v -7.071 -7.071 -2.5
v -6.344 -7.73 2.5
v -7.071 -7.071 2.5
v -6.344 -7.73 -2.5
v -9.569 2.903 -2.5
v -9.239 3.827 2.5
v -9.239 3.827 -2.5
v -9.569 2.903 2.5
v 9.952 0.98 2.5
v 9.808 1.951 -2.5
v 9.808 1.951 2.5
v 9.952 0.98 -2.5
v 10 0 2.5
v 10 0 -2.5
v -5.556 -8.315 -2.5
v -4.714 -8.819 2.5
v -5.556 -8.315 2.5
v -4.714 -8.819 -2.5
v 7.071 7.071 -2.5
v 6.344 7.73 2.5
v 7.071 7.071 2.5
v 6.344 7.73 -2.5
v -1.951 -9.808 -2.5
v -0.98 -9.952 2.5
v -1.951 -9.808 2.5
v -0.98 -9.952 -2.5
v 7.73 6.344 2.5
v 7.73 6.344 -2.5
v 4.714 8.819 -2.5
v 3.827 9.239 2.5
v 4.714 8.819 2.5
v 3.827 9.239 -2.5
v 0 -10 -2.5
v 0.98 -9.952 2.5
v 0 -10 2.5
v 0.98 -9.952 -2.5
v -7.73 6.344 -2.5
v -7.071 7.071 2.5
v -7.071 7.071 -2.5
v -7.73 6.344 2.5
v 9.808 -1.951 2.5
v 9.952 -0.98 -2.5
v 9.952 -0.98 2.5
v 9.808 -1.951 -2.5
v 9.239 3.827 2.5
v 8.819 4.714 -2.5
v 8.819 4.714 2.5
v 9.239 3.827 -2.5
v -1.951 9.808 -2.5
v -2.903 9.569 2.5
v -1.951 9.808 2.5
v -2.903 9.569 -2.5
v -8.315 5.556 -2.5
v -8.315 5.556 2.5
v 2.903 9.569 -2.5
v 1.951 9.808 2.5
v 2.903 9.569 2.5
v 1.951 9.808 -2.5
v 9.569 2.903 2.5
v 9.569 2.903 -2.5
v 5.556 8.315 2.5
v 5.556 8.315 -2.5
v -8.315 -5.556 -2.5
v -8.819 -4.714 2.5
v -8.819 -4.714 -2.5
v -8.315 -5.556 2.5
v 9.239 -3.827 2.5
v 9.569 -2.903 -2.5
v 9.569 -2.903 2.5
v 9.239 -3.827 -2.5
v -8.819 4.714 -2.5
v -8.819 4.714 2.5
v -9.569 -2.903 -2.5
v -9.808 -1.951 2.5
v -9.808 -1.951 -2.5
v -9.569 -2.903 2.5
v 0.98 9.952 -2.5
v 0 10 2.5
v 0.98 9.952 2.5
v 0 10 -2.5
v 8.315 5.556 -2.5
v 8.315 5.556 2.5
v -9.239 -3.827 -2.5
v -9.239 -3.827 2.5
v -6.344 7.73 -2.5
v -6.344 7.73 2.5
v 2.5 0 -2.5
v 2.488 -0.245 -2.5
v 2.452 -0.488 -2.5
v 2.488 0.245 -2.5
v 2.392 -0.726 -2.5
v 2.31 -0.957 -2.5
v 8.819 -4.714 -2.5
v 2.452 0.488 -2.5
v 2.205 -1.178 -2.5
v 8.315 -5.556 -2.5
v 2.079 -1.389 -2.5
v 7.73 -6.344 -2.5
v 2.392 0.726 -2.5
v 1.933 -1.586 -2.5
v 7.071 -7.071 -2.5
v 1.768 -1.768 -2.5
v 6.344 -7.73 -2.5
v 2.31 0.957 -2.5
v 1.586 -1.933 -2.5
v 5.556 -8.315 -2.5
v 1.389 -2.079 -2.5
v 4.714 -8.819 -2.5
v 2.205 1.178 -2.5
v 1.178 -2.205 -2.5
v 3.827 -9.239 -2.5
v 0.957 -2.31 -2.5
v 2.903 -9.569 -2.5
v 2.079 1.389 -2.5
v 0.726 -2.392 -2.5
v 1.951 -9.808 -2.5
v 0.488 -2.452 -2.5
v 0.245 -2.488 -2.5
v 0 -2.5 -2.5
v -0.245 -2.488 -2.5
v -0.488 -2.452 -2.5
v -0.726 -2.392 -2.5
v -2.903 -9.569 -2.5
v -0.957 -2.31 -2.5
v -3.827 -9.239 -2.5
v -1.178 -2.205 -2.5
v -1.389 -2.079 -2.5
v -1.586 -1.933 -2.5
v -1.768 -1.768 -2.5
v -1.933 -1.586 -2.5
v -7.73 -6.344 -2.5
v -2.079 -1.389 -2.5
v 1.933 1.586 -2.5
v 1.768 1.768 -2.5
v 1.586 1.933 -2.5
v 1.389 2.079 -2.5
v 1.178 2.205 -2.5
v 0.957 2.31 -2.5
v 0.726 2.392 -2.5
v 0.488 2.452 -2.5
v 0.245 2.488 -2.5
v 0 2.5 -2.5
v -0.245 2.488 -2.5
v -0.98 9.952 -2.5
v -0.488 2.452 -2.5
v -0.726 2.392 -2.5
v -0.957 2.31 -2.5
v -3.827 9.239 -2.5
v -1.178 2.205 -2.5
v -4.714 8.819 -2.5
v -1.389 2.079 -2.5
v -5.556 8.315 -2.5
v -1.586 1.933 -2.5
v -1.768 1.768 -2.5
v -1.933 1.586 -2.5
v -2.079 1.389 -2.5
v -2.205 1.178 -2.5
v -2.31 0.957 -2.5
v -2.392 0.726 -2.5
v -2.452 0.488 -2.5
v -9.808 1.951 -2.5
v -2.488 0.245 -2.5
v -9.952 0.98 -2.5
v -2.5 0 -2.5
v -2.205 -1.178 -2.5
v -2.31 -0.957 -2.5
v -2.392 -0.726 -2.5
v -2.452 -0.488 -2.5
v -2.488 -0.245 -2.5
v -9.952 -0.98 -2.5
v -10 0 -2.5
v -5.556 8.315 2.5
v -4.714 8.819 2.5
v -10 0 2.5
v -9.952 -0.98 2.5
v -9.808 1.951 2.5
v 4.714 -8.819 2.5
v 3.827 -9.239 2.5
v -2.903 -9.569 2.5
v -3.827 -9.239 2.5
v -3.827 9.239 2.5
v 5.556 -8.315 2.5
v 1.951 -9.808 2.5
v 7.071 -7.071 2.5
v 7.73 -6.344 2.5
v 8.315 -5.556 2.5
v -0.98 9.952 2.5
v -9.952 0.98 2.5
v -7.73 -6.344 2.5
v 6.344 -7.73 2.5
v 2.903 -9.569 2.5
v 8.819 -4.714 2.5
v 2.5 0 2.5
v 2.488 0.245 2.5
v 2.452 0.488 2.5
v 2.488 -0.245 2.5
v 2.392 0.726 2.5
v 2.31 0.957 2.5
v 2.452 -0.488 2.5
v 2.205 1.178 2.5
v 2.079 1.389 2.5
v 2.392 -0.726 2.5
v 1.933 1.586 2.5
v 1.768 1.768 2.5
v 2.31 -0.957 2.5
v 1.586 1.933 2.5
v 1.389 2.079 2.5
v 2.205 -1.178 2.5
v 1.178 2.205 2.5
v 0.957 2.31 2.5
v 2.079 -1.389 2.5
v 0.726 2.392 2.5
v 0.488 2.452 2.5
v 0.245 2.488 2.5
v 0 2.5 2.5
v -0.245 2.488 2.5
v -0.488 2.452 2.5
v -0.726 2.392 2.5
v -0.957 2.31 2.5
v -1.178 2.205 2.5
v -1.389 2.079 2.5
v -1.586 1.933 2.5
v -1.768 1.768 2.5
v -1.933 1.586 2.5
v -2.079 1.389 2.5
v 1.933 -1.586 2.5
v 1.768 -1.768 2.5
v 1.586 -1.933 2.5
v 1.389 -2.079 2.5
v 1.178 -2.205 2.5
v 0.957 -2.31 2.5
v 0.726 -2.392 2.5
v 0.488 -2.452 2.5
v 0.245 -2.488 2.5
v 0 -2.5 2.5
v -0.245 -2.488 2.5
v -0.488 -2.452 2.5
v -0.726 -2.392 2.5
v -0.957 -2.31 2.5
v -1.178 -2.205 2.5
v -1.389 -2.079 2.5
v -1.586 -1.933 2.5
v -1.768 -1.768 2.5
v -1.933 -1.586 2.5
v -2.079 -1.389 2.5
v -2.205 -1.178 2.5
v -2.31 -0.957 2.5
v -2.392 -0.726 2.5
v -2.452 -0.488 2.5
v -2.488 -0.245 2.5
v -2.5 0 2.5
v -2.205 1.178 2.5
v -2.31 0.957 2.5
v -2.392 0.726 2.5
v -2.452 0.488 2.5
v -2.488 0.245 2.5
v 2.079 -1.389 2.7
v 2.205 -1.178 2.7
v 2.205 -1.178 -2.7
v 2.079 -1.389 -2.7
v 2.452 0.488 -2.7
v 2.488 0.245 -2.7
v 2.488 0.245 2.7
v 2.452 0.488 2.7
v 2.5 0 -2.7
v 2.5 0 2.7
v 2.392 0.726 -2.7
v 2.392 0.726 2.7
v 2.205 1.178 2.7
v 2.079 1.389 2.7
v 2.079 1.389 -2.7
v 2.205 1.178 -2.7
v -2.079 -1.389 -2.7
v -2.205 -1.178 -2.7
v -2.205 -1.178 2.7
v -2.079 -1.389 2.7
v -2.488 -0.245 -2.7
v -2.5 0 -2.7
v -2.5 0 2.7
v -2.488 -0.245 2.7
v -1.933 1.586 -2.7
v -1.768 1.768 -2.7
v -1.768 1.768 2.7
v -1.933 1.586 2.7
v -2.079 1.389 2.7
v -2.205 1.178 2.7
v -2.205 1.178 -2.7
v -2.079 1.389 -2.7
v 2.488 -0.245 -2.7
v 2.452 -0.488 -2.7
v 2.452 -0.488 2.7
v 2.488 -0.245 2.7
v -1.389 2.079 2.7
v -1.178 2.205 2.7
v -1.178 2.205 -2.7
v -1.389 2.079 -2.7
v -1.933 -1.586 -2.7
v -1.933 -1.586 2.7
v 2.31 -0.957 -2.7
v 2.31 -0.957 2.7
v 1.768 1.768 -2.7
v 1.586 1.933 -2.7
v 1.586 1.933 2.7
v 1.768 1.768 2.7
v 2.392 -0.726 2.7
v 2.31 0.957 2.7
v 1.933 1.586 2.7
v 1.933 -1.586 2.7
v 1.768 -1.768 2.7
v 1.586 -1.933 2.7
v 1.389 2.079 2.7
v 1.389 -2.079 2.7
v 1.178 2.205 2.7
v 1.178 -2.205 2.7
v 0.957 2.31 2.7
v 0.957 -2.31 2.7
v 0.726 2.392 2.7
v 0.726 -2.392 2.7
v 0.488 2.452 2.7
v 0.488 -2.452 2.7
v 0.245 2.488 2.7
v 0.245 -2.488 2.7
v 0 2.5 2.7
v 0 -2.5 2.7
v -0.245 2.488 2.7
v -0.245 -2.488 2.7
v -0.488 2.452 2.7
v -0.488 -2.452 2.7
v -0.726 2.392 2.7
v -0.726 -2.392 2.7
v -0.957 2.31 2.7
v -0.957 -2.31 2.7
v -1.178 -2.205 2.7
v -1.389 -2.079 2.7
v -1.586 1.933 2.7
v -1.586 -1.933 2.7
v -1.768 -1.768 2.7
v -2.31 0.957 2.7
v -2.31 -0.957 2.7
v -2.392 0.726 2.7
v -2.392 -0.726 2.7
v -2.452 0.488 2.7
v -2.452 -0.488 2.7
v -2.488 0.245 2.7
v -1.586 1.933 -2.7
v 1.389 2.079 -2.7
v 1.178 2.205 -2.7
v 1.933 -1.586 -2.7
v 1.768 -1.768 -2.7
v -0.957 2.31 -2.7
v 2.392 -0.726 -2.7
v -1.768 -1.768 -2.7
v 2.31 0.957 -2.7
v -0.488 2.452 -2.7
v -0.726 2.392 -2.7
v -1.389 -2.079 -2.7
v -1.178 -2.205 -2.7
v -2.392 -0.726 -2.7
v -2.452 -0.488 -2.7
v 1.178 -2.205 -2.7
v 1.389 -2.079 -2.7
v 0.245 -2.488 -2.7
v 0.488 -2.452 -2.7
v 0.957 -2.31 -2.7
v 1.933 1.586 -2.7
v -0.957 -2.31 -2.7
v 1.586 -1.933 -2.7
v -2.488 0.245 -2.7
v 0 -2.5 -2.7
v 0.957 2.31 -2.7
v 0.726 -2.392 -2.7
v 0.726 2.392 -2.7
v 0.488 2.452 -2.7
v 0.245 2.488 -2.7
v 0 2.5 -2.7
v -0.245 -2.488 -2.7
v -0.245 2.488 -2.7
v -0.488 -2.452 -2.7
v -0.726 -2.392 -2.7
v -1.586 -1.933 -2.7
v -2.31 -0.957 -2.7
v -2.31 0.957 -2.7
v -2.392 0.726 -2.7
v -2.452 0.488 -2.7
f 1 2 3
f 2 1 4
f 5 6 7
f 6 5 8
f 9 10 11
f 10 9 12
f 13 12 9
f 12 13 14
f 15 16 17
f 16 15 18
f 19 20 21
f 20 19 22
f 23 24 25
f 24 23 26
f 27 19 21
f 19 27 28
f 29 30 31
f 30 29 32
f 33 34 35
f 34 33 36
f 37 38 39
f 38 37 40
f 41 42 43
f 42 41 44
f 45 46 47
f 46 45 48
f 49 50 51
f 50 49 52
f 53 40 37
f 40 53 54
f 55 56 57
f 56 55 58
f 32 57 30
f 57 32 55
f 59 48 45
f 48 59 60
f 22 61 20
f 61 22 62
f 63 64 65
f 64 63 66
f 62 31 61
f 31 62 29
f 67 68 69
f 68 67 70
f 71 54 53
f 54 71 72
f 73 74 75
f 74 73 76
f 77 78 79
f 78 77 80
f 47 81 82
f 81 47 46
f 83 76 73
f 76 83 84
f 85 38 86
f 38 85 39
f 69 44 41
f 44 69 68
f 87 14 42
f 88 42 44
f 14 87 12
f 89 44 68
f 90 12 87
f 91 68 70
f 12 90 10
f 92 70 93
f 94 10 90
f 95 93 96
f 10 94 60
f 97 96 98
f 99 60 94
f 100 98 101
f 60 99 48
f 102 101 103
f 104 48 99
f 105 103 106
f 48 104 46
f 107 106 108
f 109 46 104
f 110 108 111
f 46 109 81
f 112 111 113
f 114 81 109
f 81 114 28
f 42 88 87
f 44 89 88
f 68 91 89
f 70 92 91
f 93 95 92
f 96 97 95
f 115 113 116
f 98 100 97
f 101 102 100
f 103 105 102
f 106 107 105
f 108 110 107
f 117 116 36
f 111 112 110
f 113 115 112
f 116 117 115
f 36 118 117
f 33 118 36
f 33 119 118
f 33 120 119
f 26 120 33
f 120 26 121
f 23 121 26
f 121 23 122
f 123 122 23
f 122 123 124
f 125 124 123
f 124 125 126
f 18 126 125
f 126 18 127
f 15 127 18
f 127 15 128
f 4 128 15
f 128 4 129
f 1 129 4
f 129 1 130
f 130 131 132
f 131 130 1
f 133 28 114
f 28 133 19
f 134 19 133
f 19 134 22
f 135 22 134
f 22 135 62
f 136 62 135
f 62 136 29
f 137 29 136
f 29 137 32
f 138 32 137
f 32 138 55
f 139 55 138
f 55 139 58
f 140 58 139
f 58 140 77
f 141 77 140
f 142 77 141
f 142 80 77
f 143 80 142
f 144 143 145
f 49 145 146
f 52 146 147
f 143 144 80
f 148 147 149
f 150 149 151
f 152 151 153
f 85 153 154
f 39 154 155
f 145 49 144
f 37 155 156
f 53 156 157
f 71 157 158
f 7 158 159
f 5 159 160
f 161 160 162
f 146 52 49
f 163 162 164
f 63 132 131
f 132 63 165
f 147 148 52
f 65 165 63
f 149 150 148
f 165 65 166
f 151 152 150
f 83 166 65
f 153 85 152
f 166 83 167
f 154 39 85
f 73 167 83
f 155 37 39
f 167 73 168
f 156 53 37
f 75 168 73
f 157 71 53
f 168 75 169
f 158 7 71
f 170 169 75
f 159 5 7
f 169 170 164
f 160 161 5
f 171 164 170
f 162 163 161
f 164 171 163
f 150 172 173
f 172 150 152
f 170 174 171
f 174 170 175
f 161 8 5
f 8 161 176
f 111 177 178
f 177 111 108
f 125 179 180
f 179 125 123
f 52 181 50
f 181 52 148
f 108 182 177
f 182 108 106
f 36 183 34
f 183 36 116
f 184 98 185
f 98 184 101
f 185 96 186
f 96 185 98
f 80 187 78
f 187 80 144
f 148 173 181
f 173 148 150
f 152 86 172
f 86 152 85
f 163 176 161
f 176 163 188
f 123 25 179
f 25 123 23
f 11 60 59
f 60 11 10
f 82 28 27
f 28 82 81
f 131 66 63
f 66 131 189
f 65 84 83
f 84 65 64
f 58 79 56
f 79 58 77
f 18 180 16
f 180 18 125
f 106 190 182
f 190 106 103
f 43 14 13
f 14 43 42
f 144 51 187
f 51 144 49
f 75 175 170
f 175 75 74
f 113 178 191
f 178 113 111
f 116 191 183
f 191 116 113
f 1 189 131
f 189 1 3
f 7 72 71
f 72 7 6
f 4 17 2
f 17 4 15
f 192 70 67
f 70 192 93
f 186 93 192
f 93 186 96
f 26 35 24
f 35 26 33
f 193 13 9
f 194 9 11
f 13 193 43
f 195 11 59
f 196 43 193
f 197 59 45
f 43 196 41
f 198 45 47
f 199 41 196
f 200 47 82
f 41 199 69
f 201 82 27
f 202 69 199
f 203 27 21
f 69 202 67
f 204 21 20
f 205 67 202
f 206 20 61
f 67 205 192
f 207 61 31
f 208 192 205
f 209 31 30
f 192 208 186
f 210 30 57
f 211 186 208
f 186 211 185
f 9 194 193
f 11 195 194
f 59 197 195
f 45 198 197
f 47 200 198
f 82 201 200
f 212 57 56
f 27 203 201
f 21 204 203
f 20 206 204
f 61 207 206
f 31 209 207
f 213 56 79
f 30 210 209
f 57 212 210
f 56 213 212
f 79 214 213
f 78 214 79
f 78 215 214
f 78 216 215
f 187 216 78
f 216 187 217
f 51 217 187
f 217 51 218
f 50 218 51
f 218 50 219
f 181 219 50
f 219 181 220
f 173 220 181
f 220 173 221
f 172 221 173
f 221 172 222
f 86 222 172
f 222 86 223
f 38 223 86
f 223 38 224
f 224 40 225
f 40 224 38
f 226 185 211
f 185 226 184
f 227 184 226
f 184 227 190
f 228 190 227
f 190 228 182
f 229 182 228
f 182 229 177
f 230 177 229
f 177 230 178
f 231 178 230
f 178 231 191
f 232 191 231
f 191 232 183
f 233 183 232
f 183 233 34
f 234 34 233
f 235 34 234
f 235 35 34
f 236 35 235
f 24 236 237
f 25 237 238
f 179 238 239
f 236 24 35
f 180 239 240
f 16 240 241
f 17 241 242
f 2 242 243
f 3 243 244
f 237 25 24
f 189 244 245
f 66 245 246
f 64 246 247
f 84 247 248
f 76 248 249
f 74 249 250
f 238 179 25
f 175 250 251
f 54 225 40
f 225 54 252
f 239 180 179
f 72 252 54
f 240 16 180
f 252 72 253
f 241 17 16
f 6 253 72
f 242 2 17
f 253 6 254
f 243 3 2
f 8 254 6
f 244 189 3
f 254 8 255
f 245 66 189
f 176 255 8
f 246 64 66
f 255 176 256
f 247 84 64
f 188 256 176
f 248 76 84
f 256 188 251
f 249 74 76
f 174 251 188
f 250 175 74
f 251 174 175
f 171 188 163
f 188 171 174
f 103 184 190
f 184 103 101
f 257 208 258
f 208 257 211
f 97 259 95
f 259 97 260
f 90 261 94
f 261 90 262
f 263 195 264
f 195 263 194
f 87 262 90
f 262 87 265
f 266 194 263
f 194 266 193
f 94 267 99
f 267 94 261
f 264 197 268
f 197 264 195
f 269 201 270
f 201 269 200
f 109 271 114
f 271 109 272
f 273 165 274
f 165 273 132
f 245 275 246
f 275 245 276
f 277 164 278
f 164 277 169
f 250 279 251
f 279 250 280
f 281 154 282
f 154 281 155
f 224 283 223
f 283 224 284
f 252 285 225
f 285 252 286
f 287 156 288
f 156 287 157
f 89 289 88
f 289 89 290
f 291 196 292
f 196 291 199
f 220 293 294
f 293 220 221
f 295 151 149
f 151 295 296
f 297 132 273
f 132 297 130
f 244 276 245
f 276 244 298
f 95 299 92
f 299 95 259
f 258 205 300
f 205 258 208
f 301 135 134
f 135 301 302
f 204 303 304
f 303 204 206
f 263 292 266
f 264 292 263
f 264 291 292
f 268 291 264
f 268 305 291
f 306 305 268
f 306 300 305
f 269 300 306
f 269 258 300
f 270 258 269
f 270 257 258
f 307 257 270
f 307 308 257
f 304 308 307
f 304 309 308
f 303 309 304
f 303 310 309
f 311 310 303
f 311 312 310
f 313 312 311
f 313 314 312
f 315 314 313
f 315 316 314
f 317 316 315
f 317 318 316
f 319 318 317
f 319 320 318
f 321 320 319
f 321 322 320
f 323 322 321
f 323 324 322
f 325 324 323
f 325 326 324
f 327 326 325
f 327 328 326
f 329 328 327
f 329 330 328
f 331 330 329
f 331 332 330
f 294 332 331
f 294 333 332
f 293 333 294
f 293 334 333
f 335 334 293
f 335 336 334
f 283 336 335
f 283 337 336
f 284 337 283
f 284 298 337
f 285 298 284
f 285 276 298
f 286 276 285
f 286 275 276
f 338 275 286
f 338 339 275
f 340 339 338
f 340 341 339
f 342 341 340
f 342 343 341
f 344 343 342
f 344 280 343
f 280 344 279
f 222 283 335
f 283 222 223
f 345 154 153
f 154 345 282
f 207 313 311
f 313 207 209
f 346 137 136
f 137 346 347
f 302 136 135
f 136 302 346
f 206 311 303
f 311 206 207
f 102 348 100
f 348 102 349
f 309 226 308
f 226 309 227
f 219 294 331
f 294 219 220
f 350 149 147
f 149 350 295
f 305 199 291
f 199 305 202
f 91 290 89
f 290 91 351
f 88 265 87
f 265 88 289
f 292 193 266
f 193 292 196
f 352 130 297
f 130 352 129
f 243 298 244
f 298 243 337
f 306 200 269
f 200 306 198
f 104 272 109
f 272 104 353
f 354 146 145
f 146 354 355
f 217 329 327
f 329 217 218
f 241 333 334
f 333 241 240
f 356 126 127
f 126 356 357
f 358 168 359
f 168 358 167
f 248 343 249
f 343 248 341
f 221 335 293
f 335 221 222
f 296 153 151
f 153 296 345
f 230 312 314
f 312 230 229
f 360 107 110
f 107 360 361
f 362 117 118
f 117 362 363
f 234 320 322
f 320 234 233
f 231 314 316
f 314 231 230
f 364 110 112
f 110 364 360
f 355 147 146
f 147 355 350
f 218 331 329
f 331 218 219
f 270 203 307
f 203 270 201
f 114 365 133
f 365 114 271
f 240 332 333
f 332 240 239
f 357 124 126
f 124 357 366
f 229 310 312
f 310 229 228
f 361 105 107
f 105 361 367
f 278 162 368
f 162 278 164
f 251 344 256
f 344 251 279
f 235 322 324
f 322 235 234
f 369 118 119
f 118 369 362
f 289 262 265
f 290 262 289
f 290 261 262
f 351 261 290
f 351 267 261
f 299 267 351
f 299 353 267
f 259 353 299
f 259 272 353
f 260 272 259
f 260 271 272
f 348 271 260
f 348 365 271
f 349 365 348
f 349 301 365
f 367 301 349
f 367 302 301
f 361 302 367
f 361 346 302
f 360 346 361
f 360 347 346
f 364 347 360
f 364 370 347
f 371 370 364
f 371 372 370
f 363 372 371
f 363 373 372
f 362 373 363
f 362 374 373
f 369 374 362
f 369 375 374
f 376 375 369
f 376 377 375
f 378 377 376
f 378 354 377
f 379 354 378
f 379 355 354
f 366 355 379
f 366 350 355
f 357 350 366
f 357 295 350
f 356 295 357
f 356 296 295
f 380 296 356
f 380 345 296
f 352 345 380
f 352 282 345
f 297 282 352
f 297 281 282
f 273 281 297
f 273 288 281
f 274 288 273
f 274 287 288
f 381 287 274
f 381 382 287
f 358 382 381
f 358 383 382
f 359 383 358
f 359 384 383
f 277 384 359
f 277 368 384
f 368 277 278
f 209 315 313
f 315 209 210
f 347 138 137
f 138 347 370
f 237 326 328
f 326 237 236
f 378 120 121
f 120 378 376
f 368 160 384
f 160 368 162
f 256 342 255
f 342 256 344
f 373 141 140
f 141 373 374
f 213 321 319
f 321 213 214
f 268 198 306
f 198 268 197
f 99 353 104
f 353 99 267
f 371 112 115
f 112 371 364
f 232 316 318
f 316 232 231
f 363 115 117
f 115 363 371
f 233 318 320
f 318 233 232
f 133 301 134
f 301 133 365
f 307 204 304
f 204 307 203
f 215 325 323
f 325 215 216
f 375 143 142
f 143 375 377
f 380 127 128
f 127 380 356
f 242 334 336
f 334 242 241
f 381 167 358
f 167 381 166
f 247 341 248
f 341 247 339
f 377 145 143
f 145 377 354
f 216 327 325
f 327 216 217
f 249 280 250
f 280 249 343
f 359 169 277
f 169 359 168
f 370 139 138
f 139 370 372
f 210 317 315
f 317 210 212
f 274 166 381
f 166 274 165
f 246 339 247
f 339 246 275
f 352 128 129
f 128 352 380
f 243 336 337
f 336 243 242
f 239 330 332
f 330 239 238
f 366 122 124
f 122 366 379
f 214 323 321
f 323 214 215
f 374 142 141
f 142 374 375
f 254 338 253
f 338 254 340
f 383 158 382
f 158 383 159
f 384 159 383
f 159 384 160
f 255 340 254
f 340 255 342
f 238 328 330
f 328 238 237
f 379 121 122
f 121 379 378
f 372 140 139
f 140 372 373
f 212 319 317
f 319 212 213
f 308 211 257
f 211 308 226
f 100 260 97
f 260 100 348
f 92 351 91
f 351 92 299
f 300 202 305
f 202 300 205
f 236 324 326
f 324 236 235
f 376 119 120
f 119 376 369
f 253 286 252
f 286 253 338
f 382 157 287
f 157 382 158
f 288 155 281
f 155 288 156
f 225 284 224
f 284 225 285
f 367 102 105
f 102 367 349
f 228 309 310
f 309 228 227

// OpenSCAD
// Parameters
outer_diameter_mm = 20; //[10:40:1]
inner_diameter_mm = 5; //[0:20:1]
height_mm = 5; //[2.5:10:0.5]
edge_radius_mm = 1; //[0:4:0.25]
overlap_mm = 1; //[0.5:2:0.25]
eps_mm = 0.2; //[0.05:0.5:0.05]

// Magnet - complete geometry
module magnet() {
  color([0.72, 0.45, 0.2]) { // Copper color for magnet
    // Core cylinder
    cylinder(r=outer_diameter_mm/2, h=height_mm, center=true, $fn=64);

    // Top edge torus
    translate([0, 0, height_mm/2 - edge_radius_mm])
      rotate_extrude($fn=64)
      translate([outer_diameter_mm/2 - edge_radius_mm, 0])
      circle(r=edge_radius_mm, $fn=32);

    // Bottom edge torus
    translate([0, 0, -height_mm/2 + edge_radius_mm])
      rotate_extrude($fn=64)
      translate([outer_diameter_mm/2 - edge_radius_mm, 0])
      circle(r=edge_radius_mm, $fn=32);

    // Optional central bore
    if (inner_diameter_mm > 0) {
      color("Black") // Bore color
      difference() {
        cylinder(r=inner_diameter_mm/2, h=height_mm + 2*eps_mm, center=true, $fn=64);
      }
    }
  }
}

// Assembly
module assembly() {
  magnet();
}

assembly();
